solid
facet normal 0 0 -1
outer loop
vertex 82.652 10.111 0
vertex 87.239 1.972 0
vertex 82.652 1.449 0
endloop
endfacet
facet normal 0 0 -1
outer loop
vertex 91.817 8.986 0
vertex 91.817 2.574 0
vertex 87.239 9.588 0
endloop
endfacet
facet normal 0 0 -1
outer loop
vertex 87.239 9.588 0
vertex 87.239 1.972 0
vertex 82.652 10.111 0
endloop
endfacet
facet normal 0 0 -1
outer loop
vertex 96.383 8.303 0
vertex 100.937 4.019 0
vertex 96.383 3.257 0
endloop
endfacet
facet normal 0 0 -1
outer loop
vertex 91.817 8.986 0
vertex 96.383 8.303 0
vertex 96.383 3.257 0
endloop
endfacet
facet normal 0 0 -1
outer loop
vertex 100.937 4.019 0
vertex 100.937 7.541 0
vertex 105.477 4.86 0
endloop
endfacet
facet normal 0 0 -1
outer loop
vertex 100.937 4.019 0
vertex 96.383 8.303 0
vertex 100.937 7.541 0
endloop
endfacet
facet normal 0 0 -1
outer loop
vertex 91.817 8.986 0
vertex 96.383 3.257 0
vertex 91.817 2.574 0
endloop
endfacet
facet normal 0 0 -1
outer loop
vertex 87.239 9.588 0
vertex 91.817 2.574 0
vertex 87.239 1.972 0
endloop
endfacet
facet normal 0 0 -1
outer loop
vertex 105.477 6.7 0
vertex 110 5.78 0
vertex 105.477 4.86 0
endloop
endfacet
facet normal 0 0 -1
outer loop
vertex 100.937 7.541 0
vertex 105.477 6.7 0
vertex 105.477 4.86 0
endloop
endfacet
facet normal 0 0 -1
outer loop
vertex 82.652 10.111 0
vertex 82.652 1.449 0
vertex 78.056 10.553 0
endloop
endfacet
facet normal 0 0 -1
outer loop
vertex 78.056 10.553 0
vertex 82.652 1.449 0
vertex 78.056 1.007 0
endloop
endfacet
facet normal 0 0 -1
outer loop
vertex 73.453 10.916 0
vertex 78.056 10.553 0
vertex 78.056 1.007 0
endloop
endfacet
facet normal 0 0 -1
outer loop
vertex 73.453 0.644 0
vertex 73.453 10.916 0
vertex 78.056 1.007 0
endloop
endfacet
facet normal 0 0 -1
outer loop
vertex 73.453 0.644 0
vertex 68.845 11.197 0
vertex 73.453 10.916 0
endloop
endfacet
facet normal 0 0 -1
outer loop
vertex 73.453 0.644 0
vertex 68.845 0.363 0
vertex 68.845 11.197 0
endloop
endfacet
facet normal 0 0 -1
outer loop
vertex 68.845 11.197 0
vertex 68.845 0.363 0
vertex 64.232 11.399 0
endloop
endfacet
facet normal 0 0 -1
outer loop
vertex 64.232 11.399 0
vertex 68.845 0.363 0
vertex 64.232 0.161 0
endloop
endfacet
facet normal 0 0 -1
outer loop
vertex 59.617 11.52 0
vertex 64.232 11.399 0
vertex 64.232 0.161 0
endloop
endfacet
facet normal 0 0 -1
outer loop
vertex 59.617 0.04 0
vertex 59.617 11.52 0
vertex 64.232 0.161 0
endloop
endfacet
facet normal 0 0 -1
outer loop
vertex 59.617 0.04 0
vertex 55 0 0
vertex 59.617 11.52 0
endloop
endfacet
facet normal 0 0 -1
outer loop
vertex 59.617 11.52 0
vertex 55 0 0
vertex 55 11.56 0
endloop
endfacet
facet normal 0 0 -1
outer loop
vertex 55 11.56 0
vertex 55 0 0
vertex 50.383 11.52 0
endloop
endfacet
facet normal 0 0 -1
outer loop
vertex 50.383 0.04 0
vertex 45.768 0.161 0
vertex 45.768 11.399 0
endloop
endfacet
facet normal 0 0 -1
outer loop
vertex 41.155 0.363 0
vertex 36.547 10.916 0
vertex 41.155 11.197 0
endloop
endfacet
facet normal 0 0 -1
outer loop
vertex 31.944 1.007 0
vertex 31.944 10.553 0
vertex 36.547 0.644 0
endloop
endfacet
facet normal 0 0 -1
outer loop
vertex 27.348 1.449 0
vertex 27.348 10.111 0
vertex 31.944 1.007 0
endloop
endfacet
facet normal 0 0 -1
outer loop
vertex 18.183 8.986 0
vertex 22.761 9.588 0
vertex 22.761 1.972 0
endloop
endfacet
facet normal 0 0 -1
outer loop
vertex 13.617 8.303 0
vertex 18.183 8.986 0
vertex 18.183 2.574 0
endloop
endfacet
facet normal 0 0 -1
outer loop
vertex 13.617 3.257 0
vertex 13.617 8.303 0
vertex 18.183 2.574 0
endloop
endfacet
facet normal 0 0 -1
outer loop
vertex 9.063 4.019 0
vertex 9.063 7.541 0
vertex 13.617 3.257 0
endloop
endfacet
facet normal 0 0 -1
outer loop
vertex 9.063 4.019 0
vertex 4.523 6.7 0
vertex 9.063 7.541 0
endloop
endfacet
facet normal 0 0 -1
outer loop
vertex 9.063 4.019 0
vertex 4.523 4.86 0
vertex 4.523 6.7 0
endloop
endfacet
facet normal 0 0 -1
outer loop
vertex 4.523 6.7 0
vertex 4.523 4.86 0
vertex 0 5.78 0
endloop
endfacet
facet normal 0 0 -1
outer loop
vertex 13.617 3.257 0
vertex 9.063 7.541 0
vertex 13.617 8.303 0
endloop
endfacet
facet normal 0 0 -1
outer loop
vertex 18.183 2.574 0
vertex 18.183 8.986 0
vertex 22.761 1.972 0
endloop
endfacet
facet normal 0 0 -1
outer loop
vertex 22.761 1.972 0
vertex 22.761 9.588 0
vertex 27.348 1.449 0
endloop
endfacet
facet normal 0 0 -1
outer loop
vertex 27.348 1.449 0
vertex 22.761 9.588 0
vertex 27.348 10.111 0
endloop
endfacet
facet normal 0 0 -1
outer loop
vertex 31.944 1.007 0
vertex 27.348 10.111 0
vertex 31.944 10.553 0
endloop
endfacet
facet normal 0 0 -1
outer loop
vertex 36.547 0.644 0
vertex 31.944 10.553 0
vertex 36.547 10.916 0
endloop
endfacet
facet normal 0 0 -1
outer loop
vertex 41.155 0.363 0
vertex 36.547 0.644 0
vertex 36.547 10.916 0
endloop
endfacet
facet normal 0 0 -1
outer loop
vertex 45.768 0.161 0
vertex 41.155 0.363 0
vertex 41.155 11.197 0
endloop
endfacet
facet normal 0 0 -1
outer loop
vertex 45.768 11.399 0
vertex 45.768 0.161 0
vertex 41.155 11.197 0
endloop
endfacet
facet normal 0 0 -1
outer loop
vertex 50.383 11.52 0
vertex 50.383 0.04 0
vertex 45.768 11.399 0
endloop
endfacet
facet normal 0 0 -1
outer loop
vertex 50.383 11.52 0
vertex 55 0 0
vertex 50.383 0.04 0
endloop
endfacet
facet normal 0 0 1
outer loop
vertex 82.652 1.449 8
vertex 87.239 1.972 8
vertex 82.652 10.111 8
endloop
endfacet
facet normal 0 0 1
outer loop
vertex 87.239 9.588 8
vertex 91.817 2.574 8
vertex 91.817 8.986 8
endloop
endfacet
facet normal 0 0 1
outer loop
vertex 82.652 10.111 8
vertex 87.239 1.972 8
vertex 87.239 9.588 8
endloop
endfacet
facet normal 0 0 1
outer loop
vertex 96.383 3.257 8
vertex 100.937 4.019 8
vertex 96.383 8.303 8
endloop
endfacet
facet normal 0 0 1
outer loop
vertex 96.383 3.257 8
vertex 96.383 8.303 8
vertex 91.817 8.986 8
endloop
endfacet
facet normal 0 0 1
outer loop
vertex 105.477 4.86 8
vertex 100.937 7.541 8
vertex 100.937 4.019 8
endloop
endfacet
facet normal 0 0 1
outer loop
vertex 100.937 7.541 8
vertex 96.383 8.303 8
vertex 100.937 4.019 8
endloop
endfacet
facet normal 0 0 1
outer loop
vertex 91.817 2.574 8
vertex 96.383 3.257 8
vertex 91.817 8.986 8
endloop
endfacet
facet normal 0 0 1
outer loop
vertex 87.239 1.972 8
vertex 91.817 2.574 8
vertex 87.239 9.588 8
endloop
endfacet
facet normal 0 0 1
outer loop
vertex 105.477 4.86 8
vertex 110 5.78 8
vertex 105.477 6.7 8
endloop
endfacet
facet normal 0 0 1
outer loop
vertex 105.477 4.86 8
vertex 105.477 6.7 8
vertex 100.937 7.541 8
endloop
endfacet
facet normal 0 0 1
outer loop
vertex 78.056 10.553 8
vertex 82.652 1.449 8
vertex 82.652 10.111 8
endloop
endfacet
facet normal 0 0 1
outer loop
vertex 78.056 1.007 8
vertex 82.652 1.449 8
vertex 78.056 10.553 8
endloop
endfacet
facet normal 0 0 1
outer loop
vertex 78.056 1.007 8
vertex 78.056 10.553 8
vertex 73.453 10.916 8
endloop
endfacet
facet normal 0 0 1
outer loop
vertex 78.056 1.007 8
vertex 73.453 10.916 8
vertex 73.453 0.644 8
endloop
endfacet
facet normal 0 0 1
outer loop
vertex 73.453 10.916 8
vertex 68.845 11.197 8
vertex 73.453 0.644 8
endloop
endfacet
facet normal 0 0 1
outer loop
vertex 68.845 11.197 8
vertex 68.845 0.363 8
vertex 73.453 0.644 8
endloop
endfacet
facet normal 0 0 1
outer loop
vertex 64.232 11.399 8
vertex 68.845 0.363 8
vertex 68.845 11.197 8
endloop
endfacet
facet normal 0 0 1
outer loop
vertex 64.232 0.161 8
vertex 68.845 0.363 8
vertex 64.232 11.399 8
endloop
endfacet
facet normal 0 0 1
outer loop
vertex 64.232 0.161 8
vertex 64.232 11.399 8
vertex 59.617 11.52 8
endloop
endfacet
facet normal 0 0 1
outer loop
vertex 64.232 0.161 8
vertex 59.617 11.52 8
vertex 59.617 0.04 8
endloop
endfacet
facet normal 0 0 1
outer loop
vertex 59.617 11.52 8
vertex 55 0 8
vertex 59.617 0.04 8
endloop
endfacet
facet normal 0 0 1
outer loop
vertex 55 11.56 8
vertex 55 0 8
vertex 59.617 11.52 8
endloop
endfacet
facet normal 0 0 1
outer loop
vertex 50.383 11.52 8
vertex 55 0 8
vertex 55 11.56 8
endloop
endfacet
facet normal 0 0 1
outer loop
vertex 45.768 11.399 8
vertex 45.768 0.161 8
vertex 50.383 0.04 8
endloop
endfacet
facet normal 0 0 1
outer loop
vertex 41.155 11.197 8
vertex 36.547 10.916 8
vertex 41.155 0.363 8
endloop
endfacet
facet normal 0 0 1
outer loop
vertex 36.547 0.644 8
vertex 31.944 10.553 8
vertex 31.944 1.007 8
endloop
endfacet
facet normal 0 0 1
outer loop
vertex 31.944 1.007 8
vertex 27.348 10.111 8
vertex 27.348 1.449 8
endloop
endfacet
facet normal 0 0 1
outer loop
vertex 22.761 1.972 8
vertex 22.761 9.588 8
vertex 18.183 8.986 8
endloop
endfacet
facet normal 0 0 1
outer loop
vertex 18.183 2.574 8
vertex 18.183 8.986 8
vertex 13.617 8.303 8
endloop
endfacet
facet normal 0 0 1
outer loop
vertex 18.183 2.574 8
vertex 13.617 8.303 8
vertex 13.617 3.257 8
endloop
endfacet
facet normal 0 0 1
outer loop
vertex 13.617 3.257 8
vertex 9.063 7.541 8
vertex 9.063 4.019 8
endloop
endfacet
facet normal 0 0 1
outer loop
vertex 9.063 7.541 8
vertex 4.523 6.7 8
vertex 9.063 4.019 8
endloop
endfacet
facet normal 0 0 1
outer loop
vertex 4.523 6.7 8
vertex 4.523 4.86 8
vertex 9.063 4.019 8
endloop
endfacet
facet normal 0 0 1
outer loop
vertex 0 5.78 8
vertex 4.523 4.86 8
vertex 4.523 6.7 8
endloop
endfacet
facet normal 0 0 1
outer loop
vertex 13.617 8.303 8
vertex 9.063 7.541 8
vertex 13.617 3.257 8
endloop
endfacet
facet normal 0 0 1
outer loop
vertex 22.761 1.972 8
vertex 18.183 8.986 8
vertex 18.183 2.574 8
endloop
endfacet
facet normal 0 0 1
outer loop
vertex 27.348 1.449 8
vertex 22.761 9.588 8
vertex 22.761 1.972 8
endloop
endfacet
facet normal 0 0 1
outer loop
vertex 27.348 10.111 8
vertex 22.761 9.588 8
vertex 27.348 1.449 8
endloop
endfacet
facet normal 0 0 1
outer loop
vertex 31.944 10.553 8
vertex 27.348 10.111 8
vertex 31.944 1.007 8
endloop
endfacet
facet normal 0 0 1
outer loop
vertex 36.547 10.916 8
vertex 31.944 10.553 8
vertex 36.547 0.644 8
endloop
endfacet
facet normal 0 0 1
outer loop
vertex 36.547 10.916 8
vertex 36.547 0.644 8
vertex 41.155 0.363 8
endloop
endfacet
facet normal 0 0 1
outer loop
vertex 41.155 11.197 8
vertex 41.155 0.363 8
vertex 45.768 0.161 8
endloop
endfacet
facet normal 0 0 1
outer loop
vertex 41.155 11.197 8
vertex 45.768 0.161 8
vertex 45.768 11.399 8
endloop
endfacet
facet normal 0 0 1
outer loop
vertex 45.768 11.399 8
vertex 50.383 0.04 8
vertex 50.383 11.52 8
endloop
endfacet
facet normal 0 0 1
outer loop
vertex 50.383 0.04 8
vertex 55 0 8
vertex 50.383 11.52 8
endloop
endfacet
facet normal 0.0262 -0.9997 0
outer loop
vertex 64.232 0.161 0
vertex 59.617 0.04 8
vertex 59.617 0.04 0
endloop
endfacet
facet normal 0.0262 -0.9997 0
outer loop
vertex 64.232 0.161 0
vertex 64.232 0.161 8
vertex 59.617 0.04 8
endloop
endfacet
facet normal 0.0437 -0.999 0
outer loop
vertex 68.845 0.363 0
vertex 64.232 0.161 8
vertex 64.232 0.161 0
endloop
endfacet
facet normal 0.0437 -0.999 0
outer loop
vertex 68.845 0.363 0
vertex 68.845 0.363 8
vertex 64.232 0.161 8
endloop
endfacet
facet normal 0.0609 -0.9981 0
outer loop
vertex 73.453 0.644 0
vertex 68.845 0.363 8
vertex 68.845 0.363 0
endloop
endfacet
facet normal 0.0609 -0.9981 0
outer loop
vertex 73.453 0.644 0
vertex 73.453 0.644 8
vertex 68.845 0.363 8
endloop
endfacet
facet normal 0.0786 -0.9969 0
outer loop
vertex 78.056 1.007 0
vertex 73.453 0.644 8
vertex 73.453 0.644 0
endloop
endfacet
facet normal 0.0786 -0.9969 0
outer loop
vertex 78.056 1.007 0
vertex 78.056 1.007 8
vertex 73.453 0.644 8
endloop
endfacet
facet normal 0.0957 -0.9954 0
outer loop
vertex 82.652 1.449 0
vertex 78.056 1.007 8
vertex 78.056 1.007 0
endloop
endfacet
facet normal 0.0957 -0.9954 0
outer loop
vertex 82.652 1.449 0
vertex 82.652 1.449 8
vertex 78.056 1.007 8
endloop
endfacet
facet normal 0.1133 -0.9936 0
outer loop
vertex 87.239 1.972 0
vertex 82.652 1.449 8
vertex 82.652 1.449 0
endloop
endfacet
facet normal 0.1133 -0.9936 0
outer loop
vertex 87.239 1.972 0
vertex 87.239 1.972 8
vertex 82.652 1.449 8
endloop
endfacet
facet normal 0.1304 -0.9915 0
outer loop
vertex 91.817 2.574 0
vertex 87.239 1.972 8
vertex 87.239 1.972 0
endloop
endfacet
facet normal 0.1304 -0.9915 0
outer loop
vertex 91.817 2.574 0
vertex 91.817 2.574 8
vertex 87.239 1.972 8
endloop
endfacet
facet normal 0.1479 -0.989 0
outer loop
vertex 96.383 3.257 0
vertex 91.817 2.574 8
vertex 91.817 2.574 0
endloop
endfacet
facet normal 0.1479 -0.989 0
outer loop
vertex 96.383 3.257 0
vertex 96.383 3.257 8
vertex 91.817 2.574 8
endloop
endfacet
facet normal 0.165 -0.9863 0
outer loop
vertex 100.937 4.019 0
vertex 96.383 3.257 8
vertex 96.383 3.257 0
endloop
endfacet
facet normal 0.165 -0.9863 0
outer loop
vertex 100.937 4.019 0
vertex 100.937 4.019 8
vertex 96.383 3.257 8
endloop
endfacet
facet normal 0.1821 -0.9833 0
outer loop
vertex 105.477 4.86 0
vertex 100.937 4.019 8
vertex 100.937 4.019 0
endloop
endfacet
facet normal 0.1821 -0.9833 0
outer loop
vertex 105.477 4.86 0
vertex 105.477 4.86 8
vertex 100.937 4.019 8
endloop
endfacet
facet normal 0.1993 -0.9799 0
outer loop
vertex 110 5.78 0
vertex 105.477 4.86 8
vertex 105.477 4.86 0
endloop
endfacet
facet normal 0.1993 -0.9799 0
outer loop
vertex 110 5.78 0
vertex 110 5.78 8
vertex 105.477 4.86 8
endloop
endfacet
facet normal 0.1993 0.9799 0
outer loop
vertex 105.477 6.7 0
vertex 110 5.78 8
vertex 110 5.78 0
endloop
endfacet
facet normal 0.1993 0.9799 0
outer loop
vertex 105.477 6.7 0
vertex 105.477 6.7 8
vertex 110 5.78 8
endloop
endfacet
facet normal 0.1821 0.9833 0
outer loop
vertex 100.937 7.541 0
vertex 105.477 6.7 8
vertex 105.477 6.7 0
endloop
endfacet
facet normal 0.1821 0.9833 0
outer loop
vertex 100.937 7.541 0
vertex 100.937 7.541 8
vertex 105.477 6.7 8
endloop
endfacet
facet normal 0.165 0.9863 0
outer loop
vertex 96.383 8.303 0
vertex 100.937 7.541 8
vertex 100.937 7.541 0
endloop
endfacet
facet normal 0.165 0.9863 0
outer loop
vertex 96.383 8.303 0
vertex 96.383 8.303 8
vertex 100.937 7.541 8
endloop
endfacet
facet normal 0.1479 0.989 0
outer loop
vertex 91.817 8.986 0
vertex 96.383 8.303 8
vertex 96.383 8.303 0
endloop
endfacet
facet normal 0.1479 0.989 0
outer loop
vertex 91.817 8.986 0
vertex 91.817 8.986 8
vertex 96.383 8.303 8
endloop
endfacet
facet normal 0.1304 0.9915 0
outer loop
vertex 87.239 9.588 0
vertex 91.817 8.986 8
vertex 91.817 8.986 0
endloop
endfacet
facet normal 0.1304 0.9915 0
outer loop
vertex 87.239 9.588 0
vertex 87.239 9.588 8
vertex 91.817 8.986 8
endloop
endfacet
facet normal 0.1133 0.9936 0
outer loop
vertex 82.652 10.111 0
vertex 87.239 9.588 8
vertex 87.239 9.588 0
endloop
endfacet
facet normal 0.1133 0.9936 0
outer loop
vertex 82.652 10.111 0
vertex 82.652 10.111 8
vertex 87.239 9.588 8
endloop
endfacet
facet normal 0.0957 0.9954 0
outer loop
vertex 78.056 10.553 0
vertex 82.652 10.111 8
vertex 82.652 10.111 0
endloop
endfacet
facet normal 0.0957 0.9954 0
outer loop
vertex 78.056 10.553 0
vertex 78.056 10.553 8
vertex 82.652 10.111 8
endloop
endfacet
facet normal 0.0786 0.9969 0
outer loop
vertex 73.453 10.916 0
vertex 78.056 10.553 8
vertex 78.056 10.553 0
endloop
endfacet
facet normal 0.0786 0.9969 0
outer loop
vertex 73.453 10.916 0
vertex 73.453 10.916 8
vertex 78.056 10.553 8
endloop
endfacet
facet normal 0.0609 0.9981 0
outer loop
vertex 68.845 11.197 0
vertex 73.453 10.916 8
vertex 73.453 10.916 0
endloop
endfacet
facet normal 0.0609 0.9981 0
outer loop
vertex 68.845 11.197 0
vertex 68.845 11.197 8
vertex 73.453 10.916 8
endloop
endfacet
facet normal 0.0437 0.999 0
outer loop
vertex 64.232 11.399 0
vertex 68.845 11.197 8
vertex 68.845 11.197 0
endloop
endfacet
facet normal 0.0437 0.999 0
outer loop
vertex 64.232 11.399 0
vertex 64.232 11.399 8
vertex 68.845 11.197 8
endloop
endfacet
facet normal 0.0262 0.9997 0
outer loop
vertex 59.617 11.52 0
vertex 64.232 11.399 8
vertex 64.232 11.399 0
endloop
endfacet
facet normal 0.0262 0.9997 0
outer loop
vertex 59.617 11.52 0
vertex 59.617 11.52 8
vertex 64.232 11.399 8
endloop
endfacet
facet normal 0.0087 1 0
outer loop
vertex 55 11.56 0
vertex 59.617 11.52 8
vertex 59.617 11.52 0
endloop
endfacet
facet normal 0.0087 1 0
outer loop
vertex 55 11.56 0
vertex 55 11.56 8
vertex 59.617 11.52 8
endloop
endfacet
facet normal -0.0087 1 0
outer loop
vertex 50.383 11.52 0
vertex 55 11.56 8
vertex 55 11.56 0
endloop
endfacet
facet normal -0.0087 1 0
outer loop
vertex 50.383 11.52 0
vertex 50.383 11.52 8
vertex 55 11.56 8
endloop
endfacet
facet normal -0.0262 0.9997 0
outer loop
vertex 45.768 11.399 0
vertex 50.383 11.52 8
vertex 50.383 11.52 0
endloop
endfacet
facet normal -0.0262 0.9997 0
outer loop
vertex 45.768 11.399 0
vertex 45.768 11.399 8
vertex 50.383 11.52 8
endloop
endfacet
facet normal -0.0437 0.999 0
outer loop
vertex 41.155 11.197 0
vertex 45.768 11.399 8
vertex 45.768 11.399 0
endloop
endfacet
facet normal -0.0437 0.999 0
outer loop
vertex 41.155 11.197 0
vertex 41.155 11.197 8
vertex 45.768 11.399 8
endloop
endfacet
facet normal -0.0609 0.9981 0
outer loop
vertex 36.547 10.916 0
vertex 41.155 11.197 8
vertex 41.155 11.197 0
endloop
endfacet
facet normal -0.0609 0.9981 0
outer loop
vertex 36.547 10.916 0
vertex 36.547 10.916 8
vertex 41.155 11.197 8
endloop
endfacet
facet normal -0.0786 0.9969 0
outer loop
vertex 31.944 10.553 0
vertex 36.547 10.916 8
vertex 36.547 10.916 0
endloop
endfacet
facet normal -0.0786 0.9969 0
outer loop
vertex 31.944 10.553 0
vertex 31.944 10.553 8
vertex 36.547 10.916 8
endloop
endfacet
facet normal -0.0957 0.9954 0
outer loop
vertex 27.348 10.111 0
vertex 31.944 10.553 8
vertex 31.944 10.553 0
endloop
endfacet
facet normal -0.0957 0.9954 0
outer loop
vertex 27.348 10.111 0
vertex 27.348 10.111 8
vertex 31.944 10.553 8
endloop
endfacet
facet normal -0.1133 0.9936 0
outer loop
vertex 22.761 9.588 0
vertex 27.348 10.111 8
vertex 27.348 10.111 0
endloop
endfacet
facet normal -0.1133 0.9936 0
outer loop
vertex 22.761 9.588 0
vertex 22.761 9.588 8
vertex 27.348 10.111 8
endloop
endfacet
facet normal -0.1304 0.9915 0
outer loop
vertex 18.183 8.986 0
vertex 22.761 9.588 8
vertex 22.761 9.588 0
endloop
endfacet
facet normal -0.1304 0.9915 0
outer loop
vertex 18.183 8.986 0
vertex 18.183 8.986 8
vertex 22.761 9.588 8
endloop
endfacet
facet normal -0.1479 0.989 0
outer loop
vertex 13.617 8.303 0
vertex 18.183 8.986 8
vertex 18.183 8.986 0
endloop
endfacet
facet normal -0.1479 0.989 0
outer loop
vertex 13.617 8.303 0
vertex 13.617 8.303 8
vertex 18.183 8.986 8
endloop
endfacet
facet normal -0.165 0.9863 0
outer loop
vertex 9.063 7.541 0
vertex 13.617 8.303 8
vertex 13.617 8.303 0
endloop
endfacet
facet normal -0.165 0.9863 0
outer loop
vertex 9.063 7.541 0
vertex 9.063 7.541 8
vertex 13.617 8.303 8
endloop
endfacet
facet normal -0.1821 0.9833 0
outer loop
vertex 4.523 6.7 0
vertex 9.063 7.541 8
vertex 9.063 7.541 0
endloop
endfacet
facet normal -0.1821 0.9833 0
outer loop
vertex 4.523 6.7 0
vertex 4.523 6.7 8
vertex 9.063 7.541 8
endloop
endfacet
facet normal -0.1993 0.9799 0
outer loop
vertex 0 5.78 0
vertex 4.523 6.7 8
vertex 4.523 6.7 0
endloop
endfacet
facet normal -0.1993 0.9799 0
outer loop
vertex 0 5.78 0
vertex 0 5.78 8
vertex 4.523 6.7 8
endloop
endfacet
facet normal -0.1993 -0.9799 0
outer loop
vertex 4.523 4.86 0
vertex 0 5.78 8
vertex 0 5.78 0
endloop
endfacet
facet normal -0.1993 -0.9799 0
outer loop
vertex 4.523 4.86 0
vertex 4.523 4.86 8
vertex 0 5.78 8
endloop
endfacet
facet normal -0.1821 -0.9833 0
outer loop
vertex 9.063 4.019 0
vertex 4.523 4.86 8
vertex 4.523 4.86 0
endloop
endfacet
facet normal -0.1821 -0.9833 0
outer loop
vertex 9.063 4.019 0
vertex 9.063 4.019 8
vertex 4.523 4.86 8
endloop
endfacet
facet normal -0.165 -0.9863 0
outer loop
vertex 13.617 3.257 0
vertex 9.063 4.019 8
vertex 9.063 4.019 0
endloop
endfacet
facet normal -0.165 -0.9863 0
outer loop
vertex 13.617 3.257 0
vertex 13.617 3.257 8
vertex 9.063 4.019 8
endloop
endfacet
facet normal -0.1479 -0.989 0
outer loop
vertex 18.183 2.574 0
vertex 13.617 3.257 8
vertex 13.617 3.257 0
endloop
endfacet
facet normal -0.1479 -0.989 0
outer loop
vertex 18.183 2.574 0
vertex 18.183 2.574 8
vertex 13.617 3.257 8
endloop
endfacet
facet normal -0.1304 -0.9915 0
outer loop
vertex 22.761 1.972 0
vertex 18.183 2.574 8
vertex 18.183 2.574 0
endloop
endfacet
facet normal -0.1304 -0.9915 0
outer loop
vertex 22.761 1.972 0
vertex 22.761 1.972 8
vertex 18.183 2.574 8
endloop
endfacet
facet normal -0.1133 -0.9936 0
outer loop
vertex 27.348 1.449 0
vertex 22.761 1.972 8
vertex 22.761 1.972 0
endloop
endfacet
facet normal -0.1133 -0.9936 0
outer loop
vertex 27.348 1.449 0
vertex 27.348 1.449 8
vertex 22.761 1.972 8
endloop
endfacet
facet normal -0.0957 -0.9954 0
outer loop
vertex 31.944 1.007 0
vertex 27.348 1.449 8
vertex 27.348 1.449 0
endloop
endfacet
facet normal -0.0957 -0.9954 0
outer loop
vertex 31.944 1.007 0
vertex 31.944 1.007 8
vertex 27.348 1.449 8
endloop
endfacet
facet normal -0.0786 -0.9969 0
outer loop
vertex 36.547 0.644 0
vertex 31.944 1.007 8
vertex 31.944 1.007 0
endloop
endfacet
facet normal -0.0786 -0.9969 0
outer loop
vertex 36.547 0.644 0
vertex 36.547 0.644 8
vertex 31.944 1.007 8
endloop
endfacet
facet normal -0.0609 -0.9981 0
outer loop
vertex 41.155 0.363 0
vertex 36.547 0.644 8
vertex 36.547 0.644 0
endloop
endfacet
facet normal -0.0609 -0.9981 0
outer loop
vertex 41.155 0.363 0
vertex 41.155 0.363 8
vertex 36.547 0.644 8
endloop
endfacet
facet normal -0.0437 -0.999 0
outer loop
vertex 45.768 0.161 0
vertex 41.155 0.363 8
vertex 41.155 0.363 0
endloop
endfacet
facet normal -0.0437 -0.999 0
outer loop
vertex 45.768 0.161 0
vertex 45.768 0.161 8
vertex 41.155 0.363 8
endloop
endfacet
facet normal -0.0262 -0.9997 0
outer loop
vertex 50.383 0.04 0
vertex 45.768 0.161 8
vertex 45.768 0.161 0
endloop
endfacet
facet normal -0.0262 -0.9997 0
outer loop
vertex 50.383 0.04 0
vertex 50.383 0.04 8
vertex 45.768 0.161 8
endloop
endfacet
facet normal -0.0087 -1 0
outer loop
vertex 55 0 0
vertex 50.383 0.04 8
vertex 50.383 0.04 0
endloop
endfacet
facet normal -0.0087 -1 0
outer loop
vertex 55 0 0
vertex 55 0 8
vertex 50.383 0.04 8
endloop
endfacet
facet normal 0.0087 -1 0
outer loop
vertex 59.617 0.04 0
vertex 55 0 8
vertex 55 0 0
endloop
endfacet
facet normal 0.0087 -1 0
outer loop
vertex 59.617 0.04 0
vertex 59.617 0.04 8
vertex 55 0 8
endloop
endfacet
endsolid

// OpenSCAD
$fn = 32;

// ----------------------------------------------------------------------
// Arc profile plate: lens, 48 points
// ----------------------------------------------------------------------

// --- parameters (mm) ---
lens_chord = 110;         // chord length of the lens, X
arc_r = 264.54;           // radius of both arcs
arc_angle = 24;           // angle of each arc, degrees
sagitta = 5.78;           // bulge of each arc (half the lens height)
arc_step = 1;             // sampling step of the arcs, degrees
plate_t = 8;              // plate thickness, Z

bbox_y = 2 * sagitta;  // full lens height

profile = [[110, 5.78], [105.477, 6.7], [100.937, 7.541], [96.383, 8.303], [91.817, 8.986], [87.239, 9.588], [82.652, 10.111], [78.056, 10.553], [73.453, 10.916], [68.845, 11.197], [64.232, 11.399], [59.617, 11.52], [55, 11.56], [50.383, 11.52], [45.768, 11.399], [41.155, 11.197], [36.547, 10.916], [31.944, 10.553], [27.348, 10.111], [22.761, 9.588], [18.183, 8.986], [13.617, 8.303], [9.063, 7.541], [4.523, 6.7], [0, 5.78], [4.523, 4.86], [9.063, 4.019], [13.617, 3.257], [18.183, 2.574], [22.761, 1.972], [27.348, 1.449], [31.944, 1.007], [36.547, 0.644], [41.155, 0.363], [45.768, 0.161], [50.383, 0.04], [55, 0], [59.617, 0.04], [64.232, 0.161], [68.845, 0.363], [73.453, 0.644], [78.056, 1.007], [82.652, 1.449], [87.239, 1.972], [91.817, 2.574], [96.383, 3.257], [100.937, 4.019], [105.477, 4.86]];  // primary outline, 48 points, counter clockwise

// --- the one profile operation ---
linear_extrude(height = plate_t) polygon(points = profile);
